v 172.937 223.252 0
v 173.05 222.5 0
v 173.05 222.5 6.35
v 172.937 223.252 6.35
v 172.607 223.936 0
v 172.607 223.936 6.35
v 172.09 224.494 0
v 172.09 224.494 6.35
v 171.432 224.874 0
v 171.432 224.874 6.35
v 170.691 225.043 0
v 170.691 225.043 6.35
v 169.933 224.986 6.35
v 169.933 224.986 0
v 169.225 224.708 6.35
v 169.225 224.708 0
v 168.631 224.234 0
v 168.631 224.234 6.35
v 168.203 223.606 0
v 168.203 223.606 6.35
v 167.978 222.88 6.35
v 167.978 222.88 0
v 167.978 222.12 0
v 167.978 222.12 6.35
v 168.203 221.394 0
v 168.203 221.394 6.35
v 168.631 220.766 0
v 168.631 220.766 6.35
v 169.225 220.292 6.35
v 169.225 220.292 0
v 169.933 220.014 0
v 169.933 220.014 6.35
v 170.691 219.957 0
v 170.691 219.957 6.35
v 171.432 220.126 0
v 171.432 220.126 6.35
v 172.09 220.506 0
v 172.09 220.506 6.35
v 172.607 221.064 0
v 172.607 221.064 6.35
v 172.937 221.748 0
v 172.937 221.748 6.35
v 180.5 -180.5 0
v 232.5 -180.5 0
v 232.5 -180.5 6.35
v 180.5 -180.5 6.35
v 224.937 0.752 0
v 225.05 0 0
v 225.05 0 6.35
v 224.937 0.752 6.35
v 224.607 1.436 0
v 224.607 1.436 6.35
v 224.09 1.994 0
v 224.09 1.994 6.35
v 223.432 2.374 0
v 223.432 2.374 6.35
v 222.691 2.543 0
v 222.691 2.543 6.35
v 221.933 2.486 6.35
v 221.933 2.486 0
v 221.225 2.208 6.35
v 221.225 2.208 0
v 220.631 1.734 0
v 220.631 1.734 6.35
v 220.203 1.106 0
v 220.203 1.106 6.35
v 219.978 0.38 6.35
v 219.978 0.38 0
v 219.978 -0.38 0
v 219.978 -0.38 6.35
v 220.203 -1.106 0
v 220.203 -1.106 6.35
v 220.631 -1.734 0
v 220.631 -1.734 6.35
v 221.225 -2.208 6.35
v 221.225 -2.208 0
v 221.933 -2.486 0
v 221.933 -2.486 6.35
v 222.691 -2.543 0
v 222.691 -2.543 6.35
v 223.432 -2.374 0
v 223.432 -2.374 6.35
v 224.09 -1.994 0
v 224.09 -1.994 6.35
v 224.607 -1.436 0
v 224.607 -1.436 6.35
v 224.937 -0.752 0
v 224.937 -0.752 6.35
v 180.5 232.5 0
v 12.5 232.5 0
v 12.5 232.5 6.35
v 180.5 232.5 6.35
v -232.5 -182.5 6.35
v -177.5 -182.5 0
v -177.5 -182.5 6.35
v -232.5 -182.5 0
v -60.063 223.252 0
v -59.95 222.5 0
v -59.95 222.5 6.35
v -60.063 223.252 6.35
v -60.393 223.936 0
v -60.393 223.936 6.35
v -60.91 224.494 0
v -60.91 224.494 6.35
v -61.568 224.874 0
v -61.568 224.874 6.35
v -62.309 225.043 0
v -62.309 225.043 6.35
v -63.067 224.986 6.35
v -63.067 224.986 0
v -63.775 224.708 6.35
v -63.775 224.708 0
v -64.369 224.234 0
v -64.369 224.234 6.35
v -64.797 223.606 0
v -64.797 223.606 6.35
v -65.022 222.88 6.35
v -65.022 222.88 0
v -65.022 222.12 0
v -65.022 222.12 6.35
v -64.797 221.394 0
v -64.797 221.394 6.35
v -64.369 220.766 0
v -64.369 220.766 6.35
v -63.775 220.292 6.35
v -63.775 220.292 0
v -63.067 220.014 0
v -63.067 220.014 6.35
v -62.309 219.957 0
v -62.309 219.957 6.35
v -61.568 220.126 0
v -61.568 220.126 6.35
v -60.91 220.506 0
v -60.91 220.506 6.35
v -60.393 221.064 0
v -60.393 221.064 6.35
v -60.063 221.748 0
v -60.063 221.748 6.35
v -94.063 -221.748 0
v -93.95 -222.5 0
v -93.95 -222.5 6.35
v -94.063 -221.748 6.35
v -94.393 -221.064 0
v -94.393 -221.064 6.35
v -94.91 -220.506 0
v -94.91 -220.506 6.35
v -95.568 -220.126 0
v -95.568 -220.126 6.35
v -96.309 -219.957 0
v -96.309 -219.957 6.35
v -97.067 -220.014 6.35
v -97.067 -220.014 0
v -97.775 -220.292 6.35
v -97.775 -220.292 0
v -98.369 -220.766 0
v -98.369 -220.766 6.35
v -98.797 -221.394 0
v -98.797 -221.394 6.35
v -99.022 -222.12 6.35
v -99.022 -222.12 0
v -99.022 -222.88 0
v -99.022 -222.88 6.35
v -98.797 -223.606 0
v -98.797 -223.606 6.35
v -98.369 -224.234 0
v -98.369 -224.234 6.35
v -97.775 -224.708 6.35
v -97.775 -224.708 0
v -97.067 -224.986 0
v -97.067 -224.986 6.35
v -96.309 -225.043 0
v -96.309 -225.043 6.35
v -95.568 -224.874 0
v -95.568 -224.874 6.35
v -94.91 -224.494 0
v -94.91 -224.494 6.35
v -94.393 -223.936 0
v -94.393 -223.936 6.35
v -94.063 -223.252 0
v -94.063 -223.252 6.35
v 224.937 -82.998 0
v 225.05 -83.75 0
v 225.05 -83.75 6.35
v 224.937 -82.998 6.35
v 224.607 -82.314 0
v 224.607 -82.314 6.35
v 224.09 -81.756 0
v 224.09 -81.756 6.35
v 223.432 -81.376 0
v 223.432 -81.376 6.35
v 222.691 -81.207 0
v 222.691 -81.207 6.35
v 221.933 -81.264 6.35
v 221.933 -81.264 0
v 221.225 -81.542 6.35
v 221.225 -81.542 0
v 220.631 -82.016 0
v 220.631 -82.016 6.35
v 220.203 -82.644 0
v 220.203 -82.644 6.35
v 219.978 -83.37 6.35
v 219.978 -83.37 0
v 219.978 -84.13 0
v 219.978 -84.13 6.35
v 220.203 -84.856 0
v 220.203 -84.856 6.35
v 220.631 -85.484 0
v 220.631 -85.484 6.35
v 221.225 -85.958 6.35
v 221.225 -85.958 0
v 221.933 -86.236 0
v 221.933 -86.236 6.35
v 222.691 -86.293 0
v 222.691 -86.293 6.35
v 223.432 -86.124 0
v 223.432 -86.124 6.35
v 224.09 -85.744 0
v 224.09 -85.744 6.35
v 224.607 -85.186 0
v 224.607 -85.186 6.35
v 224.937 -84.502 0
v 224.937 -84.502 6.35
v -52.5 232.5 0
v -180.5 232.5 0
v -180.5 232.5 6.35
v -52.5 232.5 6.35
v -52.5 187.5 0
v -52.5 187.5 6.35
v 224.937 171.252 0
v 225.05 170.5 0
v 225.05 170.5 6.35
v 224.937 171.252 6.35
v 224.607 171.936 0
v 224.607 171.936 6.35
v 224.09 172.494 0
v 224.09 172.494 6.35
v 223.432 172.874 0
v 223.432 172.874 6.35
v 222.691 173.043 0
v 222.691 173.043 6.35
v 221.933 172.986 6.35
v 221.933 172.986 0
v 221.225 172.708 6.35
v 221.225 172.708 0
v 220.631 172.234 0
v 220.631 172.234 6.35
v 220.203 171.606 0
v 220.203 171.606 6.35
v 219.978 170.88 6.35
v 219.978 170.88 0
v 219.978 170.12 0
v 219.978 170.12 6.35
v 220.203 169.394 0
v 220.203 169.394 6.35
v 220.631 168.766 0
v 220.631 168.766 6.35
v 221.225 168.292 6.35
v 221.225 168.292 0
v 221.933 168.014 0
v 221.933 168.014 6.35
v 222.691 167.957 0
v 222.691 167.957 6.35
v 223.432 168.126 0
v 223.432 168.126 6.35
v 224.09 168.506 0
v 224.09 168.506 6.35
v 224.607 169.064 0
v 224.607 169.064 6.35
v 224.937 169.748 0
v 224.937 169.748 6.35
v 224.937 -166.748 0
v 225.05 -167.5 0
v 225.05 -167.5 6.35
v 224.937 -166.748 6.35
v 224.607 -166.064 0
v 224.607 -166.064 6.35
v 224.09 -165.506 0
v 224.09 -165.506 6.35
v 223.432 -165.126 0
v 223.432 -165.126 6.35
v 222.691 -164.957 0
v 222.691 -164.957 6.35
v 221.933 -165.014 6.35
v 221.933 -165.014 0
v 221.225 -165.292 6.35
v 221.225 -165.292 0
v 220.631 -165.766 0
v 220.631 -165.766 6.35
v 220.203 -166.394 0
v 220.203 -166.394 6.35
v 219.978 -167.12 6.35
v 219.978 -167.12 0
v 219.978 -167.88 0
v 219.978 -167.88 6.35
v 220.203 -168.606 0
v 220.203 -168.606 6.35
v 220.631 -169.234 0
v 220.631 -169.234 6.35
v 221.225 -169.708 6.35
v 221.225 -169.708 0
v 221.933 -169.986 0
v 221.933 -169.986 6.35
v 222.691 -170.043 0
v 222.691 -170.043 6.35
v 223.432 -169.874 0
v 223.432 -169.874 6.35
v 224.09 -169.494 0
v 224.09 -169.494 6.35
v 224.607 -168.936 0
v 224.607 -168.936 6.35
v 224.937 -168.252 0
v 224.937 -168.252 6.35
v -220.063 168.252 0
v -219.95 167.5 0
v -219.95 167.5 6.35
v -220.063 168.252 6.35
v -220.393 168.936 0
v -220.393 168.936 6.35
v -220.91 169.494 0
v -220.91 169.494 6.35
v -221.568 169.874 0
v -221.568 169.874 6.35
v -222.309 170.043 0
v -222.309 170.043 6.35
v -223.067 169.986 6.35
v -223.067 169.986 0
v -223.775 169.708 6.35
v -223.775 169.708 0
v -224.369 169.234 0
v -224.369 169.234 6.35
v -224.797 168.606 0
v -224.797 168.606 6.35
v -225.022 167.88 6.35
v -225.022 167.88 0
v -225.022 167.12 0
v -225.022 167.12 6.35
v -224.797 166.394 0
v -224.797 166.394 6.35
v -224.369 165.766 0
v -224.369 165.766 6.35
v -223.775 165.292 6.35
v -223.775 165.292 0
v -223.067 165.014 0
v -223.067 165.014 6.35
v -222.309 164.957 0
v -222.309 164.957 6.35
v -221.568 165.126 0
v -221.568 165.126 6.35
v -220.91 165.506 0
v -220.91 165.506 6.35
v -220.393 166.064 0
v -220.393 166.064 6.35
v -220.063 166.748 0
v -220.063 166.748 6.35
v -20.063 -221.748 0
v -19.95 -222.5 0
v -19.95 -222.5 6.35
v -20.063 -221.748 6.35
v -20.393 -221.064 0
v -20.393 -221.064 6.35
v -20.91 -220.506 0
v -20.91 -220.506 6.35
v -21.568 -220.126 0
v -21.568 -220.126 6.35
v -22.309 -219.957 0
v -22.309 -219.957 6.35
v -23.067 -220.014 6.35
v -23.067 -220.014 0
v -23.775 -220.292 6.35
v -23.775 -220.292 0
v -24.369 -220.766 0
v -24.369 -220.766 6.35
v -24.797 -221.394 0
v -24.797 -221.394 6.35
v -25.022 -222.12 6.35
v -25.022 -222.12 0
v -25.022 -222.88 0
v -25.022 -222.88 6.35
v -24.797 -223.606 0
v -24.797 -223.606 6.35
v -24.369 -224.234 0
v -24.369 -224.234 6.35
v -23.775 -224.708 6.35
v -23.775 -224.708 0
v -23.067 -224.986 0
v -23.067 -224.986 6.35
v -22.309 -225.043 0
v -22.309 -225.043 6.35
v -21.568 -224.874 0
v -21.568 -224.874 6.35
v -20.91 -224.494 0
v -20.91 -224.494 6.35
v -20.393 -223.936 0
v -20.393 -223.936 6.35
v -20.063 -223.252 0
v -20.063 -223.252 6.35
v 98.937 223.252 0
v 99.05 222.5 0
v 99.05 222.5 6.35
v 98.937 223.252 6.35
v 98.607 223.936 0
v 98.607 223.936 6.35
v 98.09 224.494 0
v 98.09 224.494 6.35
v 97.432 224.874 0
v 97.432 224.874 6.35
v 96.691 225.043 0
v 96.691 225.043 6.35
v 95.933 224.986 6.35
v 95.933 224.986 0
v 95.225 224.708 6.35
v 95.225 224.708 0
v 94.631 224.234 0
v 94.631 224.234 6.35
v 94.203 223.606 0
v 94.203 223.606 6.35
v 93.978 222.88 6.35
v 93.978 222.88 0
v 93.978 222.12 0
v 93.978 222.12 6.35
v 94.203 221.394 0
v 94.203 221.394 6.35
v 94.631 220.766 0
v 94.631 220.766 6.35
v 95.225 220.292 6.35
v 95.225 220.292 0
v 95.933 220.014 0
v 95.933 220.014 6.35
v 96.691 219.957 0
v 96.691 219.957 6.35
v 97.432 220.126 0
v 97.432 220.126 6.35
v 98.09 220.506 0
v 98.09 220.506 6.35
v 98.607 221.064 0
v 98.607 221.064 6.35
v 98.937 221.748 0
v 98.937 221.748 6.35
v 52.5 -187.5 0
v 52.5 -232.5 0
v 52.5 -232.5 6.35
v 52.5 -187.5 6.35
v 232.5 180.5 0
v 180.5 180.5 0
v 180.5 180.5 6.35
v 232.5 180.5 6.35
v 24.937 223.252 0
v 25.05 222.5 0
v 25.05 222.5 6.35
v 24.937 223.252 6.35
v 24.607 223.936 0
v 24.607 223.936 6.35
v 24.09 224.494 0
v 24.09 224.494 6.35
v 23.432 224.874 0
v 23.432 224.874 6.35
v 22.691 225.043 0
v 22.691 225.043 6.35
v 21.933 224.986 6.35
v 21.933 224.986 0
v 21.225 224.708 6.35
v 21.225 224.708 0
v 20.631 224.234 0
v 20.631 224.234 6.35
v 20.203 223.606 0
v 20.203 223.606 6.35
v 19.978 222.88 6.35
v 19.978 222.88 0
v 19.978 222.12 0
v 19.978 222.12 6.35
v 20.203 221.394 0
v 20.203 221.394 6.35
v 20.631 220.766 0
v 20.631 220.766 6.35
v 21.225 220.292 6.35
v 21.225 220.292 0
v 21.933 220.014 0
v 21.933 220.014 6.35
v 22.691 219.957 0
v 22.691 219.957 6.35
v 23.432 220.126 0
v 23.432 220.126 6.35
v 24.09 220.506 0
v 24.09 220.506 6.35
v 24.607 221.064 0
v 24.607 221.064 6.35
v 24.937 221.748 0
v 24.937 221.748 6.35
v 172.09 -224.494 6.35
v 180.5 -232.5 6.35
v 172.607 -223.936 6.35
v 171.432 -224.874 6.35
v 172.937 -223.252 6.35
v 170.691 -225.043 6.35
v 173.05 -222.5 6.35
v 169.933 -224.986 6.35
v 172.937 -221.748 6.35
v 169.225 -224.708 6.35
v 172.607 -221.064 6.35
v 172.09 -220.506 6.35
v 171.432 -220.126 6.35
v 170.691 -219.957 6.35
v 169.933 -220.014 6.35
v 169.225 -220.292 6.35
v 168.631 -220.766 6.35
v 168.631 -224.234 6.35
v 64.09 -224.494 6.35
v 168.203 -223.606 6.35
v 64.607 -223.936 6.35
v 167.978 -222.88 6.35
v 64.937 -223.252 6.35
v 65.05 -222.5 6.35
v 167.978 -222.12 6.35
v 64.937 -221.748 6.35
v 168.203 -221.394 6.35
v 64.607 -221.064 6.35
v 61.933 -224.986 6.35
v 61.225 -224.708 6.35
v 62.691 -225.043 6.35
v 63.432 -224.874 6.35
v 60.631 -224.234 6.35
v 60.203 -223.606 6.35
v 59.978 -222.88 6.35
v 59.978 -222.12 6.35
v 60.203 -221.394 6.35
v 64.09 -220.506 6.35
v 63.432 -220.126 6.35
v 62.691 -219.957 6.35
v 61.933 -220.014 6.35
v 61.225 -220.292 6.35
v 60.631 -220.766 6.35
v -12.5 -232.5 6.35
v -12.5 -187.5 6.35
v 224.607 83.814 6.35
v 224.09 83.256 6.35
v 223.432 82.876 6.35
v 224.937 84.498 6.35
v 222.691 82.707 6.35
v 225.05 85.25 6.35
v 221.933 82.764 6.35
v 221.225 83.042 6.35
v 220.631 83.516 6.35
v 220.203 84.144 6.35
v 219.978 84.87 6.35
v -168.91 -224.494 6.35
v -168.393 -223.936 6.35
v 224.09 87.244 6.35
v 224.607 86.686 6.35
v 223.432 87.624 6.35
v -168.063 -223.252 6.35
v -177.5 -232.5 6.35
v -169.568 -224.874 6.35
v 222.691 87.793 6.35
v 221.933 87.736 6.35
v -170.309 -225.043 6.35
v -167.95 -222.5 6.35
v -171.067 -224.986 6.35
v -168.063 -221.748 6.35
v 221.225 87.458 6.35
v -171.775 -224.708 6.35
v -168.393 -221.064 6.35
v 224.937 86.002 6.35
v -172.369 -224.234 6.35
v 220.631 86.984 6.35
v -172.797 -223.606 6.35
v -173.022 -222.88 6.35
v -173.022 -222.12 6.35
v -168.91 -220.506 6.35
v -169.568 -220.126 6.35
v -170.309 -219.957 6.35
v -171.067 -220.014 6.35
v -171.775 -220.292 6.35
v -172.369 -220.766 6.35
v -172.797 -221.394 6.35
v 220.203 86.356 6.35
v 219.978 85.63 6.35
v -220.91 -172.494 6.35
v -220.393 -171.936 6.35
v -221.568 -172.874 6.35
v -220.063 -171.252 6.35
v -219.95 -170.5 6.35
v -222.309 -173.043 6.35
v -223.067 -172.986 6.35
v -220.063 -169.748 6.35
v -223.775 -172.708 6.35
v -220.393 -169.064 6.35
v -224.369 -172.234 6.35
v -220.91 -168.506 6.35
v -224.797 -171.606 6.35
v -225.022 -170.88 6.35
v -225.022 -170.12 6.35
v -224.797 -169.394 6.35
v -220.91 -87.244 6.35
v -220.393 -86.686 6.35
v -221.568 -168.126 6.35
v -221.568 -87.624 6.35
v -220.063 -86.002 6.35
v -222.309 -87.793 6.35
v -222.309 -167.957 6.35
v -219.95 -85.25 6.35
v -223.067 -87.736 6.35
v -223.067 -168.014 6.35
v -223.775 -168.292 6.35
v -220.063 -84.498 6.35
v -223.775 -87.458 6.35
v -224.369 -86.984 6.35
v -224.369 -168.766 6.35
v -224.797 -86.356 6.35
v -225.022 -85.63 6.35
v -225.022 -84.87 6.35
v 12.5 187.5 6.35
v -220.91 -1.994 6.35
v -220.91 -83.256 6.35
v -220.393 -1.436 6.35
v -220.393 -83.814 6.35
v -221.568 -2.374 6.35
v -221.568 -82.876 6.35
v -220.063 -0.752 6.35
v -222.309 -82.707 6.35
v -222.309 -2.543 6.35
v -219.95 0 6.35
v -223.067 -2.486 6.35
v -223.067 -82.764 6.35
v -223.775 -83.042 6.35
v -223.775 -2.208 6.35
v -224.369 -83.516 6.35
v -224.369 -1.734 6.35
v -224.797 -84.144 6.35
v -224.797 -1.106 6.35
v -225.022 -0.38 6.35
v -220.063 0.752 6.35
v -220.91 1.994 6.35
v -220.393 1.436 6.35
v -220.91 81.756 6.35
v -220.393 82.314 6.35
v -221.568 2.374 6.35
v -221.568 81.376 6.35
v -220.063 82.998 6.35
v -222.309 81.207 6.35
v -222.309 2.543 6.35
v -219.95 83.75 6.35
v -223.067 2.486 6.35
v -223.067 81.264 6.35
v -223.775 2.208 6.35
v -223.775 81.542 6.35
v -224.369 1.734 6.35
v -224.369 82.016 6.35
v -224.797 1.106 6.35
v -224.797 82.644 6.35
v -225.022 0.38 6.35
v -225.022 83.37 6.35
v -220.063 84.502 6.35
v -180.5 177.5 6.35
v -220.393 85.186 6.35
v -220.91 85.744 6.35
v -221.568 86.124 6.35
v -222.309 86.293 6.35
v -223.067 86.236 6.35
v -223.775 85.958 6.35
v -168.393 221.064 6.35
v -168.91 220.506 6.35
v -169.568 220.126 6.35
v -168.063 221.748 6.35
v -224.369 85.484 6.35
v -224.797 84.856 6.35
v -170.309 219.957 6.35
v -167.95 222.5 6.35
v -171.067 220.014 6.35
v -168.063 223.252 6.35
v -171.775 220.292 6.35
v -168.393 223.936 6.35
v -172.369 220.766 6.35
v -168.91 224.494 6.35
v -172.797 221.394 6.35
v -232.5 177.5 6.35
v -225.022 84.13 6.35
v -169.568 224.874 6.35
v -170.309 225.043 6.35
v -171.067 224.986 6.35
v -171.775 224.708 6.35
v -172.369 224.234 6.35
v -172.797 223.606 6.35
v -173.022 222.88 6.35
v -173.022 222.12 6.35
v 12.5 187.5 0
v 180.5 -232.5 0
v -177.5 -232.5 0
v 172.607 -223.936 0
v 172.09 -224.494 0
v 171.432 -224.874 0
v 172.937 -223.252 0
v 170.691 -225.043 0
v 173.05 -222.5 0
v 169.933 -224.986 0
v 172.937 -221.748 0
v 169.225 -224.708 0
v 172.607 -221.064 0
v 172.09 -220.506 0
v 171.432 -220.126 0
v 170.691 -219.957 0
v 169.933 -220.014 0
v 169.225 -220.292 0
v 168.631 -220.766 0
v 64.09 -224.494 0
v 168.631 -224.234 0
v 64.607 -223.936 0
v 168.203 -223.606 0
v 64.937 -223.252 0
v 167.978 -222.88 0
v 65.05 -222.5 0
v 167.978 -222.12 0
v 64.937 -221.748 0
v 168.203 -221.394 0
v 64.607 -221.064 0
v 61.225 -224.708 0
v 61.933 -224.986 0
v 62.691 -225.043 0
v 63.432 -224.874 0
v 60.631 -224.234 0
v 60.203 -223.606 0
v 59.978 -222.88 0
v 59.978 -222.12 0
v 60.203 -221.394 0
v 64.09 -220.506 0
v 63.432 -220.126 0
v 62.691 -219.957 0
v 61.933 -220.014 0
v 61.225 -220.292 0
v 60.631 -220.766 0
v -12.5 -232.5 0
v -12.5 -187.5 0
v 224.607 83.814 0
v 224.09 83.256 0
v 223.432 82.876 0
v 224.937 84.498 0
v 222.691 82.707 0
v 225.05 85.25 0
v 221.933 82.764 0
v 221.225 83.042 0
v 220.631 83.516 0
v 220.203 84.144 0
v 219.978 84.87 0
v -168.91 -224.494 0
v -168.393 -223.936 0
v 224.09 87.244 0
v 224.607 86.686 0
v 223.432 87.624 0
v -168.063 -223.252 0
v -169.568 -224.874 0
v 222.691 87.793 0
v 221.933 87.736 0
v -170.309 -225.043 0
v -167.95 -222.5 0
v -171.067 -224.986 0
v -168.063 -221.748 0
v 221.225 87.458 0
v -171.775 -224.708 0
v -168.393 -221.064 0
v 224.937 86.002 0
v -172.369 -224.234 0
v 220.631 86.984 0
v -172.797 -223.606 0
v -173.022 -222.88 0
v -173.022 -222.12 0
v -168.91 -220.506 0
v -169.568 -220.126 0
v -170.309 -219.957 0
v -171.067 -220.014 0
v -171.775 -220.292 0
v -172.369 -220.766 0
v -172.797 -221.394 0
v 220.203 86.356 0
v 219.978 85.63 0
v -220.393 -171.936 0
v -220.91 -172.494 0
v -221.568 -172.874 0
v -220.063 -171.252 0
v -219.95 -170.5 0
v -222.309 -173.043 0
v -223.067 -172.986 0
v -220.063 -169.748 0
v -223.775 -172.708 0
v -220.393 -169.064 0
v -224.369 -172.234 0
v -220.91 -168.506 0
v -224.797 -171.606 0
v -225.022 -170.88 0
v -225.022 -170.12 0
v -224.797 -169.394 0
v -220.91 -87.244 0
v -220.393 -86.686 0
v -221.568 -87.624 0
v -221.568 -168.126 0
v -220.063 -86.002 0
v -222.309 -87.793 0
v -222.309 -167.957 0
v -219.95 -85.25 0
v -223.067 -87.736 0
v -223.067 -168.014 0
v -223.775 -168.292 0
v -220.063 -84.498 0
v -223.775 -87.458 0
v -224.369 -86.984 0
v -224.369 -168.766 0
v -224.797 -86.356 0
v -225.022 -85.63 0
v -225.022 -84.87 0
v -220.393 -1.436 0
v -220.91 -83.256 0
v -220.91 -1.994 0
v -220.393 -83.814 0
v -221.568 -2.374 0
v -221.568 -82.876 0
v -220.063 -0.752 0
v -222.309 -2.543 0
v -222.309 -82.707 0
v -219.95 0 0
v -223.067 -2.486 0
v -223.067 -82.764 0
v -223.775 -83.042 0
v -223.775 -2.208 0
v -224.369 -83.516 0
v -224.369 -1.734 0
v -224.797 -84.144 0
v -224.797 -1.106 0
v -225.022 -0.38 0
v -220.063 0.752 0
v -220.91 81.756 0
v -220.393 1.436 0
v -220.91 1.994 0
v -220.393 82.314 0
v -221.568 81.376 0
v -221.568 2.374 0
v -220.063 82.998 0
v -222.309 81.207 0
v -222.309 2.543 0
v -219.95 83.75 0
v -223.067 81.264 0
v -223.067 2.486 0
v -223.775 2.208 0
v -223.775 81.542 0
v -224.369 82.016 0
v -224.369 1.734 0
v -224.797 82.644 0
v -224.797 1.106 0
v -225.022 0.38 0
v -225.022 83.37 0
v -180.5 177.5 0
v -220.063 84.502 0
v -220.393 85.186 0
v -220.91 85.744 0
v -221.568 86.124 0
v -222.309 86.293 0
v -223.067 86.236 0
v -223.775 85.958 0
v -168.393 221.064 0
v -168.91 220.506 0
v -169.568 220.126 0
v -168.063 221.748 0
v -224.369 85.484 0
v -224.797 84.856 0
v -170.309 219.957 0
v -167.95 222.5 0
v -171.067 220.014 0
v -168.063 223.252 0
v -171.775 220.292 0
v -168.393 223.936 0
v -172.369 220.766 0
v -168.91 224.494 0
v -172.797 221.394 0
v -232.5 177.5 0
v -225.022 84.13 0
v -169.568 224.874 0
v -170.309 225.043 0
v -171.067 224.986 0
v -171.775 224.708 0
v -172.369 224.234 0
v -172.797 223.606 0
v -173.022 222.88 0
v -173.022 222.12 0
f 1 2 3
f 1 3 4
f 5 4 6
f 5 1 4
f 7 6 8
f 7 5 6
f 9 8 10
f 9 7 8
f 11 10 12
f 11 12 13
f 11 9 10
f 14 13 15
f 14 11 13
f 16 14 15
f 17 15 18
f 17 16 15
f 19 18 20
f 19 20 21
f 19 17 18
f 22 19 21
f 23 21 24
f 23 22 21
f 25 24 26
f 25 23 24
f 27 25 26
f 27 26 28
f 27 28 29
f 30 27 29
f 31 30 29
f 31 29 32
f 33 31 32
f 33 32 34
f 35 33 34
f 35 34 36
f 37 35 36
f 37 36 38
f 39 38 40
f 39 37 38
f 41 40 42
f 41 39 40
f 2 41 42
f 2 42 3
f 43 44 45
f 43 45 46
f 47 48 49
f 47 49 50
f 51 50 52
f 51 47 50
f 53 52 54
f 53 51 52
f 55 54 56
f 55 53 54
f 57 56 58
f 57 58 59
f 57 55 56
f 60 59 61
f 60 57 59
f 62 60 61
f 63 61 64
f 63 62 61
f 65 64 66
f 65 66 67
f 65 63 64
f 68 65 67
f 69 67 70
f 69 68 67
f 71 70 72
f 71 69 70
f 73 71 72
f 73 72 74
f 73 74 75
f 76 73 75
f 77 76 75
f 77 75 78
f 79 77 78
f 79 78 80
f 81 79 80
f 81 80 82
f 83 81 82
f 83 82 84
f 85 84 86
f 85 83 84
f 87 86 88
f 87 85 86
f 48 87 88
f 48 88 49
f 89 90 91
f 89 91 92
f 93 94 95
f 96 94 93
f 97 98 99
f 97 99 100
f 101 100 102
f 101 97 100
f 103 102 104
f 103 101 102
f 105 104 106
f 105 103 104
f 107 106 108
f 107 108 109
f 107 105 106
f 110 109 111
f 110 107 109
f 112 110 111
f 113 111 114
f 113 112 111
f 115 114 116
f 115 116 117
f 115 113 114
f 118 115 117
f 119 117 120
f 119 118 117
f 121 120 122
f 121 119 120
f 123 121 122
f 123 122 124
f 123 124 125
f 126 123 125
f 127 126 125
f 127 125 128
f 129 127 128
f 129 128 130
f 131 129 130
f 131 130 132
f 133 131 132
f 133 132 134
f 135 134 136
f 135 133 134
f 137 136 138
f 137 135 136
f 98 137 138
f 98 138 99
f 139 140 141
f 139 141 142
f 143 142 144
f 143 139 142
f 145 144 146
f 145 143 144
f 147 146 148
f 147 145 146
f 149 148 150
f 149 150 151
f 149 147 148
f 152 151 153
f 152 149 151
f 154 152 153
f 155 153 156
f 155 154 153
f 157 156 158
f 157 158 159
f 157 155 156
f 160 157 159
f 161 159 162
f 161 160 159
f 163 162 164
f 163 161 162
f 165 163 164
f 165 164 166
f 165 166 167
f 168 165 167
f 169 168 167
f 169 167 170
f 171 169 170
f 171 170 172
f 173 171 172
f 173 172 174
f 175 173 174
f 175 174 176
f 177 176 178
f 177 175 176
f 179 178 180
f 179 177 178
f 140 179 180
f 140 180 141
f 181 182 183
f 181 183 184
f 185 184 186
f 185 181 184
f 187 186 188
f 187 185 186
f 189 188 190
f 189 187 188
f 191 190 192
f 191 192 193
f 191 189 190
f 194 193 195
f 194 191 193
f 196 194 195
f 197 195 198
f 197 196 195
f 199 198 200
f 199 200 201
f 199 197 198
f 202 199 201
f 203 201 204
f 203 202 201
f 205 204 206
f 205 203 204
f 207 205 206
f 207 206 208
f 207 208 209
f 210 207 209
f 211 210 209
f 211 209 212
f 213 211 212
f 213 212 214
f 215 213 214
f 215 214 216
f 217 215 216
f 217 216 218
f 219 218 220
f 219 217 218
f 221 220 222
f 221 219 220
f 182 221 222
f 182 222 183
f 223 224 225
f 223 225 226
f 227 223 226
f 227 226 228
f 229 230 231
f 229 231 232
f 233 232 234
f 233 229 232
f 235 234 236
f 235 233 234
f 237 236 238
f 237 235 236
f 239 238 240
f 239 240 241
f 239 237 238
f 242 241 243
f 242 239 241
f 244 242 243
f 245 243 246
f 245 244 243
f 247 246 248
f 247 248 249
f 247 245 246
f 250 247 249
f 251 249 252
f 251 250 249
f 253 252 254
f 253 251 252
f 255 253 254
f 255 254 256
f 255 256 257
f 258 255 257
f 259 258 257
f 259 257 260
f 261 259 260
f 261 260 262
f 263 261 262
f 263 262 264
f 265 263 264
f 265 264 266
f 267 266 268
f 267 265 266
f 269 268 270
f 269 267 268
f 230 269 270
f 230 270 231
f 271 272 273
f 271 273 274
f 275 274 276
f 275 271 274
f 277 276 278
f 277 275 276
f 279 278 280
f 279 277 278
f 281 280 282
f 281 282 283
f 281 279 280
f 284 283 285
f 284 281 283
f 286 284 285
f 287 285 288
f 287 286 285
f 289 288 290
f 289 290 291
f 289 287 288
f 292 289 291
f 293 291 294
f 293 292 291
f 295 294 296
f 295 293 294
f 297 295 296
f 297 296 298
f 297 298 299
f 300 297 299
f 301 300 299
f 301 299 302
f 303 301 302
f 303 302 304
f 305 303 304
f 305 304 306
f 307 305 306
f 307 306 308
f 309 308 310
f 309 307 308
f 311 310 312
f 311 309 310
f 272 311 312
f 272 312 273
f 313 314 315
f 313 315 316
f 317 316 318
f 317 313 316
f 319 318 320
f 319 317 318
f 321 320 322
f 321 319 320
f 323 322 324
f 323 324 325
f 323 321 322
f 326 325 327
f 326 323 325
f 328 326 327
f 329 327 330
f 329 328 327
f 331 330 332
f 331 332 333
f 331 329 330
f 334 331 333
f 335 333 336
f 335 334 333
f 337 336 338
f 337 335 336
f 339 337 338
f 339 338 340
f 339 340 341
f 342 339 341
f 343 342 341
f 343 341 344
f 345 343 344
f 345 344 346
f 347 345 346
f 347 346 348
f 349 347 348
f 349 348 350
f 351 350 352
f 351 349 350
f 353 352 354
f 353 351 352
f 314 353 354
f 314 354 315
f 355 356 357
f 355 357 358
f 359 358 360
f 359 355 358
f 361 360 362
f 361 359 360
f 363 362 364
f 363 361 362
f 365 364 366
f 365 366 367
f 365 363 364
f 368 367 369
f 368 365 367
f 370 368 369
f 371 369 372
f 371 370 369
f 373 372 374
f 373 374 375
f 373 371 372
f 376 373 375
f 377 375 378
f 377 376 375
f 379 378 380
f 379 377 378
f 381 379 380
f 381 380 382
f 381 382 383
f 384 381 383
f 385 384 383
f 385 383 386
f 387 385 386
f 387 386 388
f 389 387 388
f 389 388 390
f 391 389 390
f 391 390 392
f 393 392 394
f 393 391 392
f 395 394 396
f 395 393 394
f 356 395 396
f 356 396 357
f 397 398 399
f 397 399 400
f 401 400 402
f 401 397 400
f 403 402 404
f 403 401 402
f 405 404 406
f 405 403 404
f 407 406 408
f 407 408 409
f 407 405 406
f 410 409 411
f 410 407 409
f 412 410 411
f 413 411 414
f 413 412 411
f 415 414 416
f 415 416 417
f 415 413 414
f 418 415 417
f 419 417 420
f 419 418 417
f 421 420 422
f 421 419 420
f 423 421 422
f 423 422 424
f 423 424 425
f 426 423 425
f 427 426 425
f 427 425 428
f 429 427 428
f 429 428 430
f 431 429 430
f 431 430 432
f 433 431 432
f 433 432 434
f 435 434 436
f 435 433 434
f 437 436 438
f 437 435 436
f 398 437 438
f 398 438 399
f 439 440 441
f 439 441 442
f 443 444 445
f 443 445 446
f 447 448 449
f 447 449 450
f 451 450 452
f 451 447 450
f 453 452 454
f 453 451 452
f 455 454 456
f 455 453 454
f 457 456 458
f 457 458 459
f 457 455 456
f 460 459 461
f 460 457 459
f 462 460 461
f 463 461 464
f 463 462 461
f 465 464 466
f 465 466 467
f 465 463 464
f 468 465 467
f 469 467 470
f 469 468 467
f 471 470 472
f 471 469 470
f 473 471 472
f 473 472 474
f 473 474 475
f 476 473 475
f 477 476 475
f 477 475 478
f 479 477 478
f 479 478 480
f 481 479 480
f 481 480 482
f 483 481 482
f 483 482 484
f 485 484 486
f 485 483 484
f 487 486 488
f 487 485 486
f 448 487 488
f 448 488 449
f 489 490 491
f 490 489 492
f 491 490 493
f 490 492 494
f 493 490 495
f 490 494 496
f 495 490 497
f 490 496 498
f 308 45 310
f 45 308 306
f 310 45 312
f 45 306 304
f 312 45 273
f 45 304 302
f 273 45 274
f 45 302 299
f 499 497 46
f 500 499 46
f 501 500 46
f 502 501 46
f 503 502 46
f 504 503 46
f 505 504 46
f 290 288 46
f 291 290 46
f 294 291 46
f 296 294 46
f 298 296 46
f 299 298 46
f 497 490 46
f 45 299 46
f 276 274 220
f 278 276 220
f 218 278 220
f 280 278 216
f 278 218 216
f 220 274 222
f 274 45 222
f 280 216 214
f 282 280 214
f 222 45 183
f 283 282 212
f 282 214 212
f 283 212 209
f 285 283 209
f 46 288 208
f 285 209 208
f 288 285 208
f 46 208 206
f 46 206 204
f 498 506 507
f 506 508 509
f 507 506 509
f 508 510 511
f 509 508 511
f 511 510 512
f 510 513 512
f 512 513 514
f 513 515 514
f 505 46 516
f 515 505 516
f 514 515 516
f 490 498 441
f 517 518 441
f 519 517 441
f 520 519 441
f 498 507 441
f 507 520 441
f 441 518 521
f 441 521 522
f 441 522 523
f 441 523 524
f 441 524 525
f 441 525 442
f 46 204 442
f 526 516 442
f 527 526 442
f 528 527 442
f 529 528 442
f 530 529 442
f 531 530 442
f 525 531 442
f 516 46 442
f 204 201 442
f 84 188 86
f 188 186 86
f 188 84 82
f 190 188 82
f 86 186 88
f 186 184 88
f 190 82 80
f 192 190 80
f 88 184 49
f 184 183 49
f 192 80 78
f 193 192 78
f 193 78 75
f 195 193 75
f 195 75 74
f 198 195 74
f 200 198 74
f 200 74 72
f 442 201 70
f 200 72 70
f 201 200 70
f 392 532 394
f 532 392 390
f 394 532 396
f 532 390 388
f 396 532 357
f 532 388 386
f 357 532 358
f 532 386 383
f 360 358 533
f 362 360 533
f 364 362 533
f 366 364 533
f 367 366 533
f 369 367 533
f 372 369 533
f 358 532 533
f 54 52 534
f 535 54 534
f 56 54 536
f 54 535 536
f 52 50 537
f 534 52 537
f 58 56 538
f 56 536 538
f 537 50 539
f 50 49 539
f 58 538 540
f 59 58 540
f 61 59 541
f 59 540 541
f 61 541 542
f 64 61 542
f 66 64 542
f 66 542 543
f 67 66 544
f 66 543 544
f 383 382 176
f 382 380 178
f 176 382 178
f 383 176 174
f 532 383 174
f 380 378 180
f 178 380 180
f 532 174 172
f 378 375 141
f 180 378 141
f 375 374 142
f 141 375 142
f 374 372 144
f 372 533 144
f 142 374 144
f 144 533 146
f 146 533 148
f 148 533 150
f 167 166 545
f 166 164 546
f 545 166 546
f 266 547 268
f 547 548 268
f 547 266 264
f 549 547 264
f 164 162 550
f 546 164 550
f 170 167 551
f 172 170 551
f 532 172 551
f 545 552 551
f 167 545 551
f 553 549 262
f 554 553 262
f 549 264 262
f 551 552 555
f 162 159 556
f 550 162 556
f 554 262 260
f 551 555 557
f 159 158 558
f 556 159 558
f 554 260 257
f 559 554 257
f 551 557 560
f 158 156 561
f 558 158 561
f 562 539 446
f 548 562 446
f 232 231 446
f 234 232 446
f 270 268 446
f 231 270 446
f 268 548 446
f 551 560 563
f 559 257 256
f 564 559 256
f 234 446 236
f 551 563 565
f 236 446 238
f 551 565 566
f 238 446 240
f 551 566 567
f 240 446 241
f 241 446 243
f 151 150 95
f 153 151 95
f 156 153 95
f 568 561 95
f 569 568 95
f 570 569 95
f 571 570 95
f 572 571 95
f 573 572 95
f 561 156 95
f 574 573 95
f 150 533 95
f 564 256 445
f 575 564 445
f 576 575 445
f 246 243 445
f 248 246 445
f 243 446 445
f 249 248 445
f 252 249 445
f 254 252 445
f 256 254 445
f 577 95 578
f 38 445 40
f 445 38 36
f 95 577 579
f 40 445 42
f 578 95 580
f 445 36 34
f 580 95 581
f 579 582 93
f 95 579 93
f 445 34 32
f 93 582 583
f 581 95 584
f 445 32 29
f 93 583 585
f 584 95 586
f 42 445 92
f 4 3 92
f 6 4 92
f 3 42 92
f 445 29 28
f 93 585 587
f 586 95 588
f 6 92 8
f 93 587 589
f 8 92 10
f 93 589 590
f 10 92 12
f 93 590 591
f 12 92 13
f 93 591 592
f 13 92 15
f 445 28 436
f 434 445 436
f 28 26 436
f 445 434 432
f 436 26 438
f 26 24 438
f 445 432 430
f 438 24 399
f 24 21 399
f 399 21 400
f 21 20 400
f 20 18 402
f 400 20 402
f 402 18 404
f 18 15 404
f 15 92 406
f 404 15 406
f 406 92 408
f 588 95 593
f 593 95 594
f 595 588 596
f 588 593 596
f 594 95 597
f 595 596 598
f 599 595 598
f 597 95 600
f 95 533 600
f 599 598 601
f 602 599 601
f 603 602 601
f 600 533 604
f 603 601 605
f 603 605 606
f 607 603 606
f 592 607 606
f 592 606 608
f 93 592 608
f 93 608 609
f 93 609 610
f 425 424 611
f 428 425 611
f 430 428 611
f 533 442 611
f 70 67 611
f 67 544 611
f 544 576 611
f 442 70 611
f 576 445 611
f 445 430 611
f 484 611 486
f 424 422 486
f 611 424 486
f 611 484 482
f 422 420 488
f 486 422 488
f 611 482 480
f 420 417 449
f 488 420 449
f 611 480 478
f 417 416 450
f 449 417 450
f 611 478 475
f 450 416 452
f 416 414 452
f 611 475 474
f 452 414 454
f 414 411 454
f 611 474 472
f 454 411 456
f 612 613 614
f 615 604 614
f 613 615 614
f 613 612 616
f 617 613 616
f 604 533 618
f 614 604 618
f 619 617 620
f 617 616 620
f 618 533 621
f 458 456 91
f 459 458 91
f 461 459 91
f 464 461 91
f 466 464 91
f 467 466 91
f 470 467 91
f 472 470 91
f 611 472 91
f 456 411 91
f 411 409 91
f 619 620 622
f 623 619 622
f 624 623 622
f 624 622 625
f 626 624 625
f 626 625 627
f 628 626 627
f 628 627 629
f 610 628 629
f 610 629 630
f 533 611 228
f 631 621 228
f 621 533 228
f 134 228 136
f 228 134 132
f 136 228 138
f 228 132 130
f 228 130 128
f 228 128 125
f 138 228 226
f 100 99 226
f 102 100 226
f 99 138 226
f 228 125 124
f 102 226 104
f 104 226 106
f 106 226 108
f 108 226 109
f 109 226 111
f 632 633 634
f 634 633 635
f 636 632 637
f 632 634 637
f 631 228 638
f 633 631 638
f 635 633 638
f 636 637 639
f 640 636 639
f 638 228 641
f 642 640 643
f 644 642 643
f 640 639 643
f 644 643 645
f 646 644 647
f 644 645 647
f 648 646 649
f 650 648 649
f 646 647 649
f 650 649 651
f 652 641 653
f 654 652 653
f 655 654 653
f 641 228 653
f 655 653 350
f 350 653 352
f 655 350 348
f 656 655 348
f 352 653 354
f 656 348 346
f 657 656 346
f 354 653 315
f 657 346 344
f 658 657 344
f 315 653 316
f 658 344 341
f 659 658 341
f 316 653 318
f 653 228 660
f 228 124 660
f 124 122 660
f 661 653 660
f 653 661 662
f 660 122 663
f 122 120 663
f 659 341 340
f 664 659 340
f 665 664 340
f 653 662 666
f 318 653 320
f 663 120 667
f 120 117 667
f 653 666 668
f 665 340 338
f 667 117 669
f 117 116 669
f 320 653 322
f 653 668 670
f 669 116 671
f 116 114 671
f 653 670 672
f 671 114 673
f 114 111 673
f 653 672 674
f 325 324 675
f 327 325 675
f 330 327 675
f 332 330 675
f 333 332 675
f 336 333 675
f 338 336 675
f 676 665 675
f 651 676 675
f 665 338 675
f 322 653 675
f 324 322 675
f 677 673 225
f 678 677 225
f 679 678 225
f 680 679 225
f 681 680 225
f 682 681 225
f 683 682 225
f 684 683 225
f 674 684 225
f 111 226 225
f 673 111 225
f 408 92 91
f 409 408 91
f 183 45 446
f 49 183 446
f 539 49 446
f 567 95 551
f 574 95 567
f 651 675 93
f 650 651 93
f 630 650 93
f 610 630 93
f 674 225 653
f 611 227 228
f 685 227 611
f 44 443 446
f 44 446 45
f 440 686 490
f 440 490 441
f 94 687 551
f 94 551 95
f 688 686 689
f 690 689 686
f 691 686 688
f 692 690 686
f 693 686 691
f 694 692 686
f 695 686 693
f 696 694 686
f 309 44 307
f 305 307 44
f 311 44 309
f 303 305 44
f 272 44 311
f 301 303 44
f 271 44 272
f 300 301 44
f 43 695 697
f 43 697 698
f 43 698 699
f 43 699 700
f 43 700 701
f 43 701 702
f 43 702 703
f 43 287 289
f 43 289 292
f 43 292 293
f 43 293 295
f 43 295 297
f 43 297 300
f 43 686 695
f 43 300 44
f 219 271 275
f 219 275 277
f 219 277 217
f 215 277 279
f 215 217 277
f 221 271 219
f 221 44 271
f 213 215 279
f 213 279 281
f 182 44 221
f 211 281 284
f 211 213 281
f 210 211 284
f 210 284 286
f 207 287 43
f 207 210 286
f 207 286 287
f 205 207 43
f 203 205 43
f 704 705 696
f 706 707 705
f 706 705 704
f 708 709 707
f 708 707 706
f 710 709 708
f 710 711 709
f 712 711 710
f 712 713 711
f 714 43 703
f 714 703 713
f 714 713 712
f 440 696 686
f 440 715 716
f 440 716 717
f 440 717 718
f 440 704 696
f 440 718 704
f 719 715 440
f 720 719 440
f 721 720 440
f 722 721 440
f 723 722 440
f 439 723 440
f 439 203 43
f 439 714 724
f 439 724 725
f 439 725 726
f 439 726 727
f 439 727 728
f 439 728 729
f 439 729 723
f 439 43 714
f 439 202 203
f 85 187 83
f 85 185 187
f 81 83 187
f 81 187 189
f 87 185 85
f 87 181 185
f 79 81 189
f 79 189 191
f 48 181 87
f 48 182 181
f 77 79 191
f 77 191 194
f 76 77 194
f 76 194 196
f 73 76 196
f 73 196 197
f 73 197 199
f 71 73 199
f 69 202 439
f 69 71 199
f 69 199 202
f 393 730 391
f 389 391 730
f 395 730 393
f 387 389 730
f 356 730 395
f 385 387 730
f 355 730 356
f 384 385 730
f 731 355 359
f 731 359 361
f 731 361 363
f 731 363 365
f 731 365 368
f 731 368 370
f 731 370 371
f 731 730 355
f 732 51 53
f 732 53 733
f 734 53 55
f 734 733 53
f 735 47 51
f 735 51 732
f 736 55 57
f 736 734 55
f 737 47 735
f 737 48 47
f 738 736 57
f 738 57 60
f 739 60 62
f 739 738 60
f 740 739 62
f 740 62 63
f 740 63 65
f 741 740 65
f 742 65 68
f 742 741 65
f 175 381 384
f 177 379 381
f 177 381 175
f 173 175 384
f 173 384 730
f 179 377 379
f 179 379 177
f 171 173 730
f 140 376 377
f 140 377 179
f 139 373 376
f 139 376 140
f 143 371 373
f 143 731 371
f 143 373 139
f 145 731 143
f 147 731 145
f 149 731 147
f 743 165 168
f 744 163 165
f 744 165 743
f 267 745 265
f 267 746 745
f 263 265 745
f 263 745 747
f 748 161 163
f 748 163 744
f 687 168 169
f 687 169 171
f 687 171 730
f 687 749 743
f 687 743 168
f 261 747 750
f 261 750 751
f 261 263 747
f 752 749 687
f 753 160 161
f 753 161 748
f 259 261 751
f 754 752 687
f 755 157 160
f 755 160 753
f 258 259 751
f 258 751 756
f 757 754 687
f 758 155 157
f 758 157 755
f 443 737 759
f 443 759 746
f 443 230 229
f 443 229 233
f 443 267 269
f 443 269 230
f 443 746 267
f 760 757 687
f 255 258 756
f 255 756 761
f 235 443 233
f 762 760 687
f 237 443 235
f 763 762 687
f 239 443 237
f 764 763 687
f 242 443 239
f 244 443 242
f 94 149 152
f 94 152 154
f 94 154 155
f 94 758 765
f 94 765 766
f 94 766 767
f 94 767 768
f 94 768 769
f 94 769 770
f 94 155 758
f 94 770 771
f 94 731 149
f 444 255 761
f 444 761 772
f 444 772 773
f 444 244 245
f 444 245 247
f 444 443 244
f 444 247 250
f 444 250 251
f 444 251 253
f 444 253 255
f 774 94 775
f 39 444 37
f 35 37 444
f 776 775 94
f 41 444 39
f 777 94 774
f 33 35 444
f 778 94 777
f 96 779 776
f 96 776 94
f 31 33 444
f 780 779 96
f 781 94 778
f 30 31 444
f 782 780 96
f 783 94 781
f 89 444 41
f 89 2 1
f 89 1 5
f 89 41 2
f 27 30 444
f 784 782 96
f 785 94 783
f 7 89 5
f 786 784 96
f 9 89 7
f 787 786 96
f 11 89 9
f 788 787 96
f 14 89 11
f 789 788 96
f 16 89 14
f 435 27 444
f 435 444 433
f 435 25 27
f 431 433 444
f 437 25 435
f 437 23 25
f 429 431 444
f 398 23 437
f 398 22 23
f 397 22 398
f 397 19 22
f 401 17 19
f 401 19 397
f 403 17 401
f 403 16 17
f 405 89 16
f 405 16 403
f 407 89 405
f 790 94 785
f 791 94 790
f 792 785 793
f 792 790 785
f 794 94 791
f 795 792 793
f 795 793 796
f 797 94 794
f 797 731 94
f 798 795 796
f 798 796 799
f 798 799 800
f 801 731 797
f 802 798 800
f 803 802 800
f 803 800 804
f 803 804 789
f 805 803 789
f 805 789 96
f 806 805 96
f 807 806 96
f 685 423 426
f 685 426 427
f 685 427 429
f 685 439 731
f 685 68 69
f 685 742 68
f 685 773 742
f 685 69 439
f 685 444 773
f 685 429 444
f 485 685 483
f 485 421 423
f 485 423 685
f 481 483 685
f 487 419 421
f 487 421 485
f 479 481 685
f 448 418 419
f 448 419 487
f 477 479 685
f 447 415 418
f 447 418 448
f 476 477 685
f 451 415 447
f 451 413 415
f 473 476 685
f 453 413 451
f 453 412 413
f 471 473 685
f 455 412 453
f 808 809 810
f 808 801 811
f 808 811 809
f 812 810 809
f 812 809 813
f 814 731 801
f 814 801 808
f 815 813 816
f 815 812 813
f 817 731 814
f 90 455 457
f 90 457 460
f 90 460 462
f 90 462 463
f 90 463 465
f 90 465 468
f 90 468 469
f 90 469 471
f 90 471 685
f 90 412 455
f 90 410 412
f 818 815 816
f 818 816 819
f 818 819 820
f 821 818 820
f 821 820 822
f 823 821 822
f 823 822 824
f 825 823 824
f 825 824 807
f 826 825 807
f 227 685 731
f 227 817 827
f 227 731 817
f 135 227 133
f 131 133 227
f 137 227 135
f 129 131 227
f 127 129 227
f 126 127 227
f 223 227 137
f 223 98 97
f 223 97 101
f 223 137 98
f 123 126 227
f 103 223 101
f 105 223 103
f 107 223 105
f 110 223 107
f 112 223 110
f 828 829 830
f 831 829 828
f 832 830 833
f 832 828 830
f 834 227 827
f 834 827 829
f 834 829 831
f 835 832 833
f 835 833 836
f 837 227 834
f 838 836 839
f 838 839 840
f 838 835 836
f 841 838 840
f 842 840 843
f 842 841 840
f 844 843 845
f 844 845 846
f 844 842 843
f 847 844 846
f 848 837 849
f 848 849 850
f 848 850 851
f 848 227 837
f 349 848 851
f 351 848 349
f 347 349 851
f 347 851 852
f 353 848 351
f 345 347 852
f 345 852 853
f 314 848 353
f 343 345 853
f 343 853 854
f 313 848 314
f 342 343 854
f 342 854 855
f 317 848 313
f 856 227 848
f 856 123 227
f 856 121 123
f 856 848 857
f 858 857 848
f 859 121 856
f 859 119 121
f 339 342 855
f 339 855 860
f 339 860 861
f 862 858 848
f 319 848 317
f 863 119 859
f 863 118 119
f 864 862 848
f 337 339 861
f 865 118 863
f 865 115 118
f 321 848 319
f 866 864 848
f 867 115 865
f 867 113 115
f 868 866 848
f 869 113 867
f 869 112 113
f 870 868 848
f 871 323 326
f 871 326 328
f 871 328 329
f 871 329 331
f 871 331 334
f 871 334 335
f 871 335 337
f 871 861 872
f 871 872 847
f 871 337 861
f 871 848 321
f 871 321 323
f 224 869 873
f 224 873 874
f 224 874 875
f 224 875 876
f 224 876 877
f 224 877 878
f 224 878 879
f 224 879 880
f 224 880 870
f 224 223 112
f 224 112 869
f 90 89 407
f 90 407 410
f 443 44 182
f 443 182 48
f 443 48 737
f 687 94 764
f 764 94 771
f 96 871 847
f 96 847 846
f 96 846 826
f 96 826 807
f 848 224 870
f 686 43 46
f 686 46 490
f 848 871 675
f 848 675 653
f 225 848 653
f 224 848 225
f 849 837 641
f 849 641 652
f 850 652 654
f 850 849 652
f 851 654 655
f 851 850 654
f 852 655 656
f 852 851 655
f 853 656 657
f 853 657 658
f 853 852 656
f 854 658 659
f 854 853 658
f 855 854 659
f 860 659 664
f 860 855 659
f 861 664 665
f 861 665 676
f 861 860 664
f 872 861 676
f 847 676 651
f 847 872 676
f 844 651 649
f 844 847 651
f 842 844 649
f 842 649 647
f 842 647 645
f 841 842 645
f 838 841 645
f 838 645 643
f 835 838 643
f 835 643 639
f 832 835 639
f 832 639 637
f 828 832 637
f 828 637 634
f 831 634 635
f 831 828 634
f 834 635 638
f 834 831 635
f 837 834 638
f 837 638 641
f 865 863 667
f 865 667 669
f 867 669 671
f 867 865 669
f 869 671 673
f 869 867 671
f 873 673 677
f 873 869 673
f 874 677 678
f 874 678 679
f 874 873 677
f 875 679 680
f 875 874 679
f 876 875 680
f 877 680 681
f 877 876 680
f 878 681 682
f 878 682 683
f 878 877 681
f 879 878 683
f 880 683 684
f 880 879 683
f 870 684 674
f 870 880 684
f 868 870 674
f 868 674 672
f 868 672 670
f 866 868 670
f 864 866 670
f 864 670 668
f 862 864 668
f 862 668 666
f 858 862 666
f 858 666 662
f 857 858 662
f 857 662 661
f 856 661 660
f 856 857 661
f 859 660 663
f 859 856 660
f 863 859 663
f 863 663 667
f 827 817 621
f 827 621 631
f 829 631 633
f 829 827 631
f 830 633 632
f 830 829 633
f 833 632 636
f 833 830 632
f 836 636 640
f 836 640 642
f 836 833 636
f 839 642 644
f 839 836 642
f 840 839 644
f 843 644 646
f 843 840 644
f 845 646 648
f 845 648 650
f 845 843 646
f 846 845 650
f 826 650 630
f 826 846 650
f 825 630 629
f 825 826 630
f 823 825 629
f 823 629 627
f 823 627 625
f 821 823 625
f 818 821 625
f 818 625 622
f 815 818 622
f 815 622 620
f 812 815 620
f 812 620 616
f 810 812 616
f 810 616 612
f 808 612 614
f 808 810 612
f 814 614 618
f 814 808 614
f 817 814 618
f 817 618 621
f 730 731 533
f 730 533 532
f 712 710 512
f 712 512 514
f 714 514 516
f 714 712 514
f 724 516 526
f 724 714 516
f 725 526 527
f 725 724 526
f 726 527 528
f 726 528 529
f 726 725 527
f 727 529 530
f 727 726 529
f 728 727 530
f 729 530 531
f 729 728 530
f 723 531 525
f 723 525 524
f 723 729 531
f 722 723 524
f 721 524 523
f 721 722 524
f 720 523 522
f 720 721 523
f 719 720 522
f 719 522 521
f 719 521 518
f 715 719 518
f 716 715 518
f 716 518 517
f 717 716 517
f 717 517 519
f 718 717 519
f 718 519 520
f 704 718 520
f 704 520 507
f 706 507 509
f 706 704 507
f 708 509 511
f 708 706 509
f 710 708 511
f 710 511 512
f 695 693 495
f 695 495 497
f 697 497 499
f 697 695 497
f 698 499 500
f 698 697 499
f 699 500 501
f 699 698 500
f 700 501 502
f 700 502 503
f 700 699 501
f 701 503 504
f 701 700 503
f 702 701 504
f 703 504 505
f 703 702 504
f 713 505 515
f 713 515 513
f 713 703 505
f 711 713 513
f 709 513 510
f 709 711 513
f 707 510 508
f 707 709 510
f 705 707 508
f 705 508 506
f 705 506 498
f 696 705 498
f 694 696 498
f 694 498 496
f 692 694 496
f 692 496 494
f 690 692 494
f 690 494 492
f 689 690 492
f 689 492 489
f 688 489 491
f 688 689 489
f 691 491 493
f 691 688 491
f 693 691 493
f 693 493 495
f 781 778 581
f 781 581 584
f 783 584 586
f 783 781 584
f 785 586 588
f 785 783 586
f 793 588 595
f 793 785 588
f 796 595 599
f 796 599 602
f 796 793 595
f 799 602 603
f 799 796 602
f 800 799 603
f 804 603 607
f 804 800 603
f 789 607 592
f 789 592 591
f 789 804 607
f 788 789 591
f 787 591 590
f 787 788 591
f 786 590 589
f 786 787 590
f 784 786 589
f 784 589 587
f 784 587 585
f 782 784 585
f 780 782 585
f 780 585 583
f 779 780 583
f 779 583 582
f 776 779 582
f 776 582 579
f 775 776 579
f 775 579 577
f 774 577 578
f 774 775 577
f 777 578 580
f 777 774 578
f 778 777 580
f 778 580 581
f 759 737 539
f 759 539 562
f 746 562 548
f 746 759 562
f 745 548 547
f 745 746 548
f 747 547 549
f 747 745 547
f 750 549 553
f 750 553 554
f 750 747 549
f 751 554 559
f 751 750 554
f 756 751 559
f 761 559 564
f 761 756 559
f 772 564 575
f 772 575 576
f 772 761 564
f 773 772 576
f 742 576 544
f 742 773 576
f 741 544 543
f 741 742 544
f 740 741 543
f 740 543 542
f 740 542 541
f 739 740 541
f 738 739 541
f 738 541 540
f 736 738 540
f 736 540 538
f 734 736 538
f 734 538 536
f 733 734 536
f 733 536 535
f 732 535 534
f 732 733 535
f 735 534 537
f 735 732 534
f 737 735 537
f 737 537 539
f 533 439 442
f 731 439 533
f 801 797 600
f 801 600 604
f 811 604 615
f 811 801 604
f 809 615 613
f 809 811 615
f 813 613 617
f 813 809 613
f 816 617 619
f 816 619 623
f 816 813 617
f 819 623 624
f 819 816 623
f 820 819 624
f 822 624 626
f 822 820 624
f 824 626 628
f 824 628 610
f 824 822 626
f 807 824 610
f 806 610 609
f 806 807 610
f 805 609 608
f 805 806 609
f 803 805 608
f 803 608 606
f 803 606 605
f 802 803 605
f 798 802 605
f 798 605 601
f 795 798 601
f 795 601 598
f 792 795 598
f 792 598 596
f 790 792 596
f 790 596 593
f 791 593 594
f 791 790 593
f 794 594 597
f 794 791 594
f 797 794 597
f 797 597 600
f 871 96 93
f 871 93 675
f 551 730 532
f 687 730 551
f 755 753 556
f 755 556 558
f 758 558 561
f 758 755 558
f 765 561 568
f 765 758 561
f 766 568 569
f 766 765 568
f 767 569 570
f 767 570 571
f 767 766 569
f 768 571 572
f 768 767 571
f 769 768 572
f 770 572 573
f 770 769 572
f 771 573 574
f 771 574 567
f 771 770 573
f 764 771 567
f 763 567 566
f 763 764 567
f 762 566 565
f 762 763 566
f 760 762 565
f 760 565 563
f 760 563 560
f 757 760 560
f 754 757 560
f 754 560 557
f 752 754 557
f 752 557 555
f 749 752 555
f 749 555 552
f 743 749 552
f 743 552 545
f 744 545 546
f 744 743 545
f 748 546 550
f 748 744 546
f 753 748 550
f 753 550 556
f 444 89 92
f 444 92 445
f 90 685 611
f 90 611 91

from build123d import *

# Parameters (mm, degrees)
SKETCH1_R           = 2.55
BOSS_EXTRUDE1_DEPTH = 6.35


with BuildPart() as part:
    # Sketch1 → Boss-Extrude1 (new body)
    with BuildSketch(Plane.XY):
        Polygon((12.5, 232.5), (180.5, 232.5), (180.5, 180.5), (232.5, 180.5), (232.5, -180.5), (180.5, -180.5), (180.5, -232.5), (52.5, -232.5), (52.5, -187.5), (-12.5, -187.5), (-12.5, -232.5), (-177.5, -232.5), (-177.5, -182.5), (-232.5, -182.5), (-232.5, 177.5), (-180.5, 177.5), (-180.5, 232.5), (-52.5, 232.5), (-52.5, 187.5), (12.5, 187.5), align=None)
        with Locations((222.5, 170.5)):
            Circle(SKETCH1_R, mode=Mode.SUBTRACT)
        with Locations((170.5, 222.5)):
            Circle(SKETCH1_R, mode=Mode.SUBTRACT)
        with Locations((22.5, 222.5)):
            Circle(SKETCH1_R, mode=Mode.SUBTRACT)
        with Locations((96.5, 222.5)):
            Circle(SKETCH1_R, mode=Mode.SUBTRACT)
        with Locations((-170.5, 222.5)):
            Circle(SKETCH1_R, mode=Mode.SUBTRACT)
        with Locations((-62.5, 222.5)):
            Circle(SKETCH1_R, mode=Mode.SUBTRACT)
        with Locations((-222.5, 167.5)):
            Circle(SKETCH1_R, mode=Mode.SUBTRACT)
        with Locations((222.5, 0)):
            Circle(SKETCH1_R, mode=Mode.SUBTRACT)
        with Locations((222.5, 85.25)):
            Circle(SKETCH1_R, mode=Mode.SUBTRACT)
        with Locations((-222.5, 0)):
            Circle(SKETCH1_R, mode=Mode.SUBTRACT)
        with Locations((-222.5, 83.75)):
            Circle(SKETCH1_R, mode=Mode.SUBTRACT)
        with Locations((222.5, -83.75)):
            Circle(SKETCH1_R, mode=Mode.SUBTRACT)
        with Locations((222.5, -167.5)):
            Circle(SKETCH1_R, mode=Mode.SUBTRACT)
        with Locations((170.5, -222.5)):
            Circle(SKETCH1_R, mode=Mode.SUBTRACT)
        with Locations((62.5, -222.5)):
            Circle(SKETCH1_R, mode=Mode.SUBTRACT)
        with Locations((-22.5, -222.5)):
            Circle(SKETCH1_R, mode=Mode.SUBTRACT)
        with Locations((-96.5, -222.5)):
            Circle(SKETCH1_R, mode=Mode.SUBTRACT)
        with Locations((-170.5, -222.5)):
            Circle(SKETCH1_R, mode=Mode.SUBTRACT)
        with Locations((-222.5, -170.5)):
            Circle(SKETCH1_R, mode=Mode.SUBTRACT)
        with Locations((-222.5, -85.25)):
            Circle(SKETCH1_R, mode=Mode.SUBTRACT)
    extrude(amount=BOSS_EXTRUDE1_DEPTH)


solid = part.part
